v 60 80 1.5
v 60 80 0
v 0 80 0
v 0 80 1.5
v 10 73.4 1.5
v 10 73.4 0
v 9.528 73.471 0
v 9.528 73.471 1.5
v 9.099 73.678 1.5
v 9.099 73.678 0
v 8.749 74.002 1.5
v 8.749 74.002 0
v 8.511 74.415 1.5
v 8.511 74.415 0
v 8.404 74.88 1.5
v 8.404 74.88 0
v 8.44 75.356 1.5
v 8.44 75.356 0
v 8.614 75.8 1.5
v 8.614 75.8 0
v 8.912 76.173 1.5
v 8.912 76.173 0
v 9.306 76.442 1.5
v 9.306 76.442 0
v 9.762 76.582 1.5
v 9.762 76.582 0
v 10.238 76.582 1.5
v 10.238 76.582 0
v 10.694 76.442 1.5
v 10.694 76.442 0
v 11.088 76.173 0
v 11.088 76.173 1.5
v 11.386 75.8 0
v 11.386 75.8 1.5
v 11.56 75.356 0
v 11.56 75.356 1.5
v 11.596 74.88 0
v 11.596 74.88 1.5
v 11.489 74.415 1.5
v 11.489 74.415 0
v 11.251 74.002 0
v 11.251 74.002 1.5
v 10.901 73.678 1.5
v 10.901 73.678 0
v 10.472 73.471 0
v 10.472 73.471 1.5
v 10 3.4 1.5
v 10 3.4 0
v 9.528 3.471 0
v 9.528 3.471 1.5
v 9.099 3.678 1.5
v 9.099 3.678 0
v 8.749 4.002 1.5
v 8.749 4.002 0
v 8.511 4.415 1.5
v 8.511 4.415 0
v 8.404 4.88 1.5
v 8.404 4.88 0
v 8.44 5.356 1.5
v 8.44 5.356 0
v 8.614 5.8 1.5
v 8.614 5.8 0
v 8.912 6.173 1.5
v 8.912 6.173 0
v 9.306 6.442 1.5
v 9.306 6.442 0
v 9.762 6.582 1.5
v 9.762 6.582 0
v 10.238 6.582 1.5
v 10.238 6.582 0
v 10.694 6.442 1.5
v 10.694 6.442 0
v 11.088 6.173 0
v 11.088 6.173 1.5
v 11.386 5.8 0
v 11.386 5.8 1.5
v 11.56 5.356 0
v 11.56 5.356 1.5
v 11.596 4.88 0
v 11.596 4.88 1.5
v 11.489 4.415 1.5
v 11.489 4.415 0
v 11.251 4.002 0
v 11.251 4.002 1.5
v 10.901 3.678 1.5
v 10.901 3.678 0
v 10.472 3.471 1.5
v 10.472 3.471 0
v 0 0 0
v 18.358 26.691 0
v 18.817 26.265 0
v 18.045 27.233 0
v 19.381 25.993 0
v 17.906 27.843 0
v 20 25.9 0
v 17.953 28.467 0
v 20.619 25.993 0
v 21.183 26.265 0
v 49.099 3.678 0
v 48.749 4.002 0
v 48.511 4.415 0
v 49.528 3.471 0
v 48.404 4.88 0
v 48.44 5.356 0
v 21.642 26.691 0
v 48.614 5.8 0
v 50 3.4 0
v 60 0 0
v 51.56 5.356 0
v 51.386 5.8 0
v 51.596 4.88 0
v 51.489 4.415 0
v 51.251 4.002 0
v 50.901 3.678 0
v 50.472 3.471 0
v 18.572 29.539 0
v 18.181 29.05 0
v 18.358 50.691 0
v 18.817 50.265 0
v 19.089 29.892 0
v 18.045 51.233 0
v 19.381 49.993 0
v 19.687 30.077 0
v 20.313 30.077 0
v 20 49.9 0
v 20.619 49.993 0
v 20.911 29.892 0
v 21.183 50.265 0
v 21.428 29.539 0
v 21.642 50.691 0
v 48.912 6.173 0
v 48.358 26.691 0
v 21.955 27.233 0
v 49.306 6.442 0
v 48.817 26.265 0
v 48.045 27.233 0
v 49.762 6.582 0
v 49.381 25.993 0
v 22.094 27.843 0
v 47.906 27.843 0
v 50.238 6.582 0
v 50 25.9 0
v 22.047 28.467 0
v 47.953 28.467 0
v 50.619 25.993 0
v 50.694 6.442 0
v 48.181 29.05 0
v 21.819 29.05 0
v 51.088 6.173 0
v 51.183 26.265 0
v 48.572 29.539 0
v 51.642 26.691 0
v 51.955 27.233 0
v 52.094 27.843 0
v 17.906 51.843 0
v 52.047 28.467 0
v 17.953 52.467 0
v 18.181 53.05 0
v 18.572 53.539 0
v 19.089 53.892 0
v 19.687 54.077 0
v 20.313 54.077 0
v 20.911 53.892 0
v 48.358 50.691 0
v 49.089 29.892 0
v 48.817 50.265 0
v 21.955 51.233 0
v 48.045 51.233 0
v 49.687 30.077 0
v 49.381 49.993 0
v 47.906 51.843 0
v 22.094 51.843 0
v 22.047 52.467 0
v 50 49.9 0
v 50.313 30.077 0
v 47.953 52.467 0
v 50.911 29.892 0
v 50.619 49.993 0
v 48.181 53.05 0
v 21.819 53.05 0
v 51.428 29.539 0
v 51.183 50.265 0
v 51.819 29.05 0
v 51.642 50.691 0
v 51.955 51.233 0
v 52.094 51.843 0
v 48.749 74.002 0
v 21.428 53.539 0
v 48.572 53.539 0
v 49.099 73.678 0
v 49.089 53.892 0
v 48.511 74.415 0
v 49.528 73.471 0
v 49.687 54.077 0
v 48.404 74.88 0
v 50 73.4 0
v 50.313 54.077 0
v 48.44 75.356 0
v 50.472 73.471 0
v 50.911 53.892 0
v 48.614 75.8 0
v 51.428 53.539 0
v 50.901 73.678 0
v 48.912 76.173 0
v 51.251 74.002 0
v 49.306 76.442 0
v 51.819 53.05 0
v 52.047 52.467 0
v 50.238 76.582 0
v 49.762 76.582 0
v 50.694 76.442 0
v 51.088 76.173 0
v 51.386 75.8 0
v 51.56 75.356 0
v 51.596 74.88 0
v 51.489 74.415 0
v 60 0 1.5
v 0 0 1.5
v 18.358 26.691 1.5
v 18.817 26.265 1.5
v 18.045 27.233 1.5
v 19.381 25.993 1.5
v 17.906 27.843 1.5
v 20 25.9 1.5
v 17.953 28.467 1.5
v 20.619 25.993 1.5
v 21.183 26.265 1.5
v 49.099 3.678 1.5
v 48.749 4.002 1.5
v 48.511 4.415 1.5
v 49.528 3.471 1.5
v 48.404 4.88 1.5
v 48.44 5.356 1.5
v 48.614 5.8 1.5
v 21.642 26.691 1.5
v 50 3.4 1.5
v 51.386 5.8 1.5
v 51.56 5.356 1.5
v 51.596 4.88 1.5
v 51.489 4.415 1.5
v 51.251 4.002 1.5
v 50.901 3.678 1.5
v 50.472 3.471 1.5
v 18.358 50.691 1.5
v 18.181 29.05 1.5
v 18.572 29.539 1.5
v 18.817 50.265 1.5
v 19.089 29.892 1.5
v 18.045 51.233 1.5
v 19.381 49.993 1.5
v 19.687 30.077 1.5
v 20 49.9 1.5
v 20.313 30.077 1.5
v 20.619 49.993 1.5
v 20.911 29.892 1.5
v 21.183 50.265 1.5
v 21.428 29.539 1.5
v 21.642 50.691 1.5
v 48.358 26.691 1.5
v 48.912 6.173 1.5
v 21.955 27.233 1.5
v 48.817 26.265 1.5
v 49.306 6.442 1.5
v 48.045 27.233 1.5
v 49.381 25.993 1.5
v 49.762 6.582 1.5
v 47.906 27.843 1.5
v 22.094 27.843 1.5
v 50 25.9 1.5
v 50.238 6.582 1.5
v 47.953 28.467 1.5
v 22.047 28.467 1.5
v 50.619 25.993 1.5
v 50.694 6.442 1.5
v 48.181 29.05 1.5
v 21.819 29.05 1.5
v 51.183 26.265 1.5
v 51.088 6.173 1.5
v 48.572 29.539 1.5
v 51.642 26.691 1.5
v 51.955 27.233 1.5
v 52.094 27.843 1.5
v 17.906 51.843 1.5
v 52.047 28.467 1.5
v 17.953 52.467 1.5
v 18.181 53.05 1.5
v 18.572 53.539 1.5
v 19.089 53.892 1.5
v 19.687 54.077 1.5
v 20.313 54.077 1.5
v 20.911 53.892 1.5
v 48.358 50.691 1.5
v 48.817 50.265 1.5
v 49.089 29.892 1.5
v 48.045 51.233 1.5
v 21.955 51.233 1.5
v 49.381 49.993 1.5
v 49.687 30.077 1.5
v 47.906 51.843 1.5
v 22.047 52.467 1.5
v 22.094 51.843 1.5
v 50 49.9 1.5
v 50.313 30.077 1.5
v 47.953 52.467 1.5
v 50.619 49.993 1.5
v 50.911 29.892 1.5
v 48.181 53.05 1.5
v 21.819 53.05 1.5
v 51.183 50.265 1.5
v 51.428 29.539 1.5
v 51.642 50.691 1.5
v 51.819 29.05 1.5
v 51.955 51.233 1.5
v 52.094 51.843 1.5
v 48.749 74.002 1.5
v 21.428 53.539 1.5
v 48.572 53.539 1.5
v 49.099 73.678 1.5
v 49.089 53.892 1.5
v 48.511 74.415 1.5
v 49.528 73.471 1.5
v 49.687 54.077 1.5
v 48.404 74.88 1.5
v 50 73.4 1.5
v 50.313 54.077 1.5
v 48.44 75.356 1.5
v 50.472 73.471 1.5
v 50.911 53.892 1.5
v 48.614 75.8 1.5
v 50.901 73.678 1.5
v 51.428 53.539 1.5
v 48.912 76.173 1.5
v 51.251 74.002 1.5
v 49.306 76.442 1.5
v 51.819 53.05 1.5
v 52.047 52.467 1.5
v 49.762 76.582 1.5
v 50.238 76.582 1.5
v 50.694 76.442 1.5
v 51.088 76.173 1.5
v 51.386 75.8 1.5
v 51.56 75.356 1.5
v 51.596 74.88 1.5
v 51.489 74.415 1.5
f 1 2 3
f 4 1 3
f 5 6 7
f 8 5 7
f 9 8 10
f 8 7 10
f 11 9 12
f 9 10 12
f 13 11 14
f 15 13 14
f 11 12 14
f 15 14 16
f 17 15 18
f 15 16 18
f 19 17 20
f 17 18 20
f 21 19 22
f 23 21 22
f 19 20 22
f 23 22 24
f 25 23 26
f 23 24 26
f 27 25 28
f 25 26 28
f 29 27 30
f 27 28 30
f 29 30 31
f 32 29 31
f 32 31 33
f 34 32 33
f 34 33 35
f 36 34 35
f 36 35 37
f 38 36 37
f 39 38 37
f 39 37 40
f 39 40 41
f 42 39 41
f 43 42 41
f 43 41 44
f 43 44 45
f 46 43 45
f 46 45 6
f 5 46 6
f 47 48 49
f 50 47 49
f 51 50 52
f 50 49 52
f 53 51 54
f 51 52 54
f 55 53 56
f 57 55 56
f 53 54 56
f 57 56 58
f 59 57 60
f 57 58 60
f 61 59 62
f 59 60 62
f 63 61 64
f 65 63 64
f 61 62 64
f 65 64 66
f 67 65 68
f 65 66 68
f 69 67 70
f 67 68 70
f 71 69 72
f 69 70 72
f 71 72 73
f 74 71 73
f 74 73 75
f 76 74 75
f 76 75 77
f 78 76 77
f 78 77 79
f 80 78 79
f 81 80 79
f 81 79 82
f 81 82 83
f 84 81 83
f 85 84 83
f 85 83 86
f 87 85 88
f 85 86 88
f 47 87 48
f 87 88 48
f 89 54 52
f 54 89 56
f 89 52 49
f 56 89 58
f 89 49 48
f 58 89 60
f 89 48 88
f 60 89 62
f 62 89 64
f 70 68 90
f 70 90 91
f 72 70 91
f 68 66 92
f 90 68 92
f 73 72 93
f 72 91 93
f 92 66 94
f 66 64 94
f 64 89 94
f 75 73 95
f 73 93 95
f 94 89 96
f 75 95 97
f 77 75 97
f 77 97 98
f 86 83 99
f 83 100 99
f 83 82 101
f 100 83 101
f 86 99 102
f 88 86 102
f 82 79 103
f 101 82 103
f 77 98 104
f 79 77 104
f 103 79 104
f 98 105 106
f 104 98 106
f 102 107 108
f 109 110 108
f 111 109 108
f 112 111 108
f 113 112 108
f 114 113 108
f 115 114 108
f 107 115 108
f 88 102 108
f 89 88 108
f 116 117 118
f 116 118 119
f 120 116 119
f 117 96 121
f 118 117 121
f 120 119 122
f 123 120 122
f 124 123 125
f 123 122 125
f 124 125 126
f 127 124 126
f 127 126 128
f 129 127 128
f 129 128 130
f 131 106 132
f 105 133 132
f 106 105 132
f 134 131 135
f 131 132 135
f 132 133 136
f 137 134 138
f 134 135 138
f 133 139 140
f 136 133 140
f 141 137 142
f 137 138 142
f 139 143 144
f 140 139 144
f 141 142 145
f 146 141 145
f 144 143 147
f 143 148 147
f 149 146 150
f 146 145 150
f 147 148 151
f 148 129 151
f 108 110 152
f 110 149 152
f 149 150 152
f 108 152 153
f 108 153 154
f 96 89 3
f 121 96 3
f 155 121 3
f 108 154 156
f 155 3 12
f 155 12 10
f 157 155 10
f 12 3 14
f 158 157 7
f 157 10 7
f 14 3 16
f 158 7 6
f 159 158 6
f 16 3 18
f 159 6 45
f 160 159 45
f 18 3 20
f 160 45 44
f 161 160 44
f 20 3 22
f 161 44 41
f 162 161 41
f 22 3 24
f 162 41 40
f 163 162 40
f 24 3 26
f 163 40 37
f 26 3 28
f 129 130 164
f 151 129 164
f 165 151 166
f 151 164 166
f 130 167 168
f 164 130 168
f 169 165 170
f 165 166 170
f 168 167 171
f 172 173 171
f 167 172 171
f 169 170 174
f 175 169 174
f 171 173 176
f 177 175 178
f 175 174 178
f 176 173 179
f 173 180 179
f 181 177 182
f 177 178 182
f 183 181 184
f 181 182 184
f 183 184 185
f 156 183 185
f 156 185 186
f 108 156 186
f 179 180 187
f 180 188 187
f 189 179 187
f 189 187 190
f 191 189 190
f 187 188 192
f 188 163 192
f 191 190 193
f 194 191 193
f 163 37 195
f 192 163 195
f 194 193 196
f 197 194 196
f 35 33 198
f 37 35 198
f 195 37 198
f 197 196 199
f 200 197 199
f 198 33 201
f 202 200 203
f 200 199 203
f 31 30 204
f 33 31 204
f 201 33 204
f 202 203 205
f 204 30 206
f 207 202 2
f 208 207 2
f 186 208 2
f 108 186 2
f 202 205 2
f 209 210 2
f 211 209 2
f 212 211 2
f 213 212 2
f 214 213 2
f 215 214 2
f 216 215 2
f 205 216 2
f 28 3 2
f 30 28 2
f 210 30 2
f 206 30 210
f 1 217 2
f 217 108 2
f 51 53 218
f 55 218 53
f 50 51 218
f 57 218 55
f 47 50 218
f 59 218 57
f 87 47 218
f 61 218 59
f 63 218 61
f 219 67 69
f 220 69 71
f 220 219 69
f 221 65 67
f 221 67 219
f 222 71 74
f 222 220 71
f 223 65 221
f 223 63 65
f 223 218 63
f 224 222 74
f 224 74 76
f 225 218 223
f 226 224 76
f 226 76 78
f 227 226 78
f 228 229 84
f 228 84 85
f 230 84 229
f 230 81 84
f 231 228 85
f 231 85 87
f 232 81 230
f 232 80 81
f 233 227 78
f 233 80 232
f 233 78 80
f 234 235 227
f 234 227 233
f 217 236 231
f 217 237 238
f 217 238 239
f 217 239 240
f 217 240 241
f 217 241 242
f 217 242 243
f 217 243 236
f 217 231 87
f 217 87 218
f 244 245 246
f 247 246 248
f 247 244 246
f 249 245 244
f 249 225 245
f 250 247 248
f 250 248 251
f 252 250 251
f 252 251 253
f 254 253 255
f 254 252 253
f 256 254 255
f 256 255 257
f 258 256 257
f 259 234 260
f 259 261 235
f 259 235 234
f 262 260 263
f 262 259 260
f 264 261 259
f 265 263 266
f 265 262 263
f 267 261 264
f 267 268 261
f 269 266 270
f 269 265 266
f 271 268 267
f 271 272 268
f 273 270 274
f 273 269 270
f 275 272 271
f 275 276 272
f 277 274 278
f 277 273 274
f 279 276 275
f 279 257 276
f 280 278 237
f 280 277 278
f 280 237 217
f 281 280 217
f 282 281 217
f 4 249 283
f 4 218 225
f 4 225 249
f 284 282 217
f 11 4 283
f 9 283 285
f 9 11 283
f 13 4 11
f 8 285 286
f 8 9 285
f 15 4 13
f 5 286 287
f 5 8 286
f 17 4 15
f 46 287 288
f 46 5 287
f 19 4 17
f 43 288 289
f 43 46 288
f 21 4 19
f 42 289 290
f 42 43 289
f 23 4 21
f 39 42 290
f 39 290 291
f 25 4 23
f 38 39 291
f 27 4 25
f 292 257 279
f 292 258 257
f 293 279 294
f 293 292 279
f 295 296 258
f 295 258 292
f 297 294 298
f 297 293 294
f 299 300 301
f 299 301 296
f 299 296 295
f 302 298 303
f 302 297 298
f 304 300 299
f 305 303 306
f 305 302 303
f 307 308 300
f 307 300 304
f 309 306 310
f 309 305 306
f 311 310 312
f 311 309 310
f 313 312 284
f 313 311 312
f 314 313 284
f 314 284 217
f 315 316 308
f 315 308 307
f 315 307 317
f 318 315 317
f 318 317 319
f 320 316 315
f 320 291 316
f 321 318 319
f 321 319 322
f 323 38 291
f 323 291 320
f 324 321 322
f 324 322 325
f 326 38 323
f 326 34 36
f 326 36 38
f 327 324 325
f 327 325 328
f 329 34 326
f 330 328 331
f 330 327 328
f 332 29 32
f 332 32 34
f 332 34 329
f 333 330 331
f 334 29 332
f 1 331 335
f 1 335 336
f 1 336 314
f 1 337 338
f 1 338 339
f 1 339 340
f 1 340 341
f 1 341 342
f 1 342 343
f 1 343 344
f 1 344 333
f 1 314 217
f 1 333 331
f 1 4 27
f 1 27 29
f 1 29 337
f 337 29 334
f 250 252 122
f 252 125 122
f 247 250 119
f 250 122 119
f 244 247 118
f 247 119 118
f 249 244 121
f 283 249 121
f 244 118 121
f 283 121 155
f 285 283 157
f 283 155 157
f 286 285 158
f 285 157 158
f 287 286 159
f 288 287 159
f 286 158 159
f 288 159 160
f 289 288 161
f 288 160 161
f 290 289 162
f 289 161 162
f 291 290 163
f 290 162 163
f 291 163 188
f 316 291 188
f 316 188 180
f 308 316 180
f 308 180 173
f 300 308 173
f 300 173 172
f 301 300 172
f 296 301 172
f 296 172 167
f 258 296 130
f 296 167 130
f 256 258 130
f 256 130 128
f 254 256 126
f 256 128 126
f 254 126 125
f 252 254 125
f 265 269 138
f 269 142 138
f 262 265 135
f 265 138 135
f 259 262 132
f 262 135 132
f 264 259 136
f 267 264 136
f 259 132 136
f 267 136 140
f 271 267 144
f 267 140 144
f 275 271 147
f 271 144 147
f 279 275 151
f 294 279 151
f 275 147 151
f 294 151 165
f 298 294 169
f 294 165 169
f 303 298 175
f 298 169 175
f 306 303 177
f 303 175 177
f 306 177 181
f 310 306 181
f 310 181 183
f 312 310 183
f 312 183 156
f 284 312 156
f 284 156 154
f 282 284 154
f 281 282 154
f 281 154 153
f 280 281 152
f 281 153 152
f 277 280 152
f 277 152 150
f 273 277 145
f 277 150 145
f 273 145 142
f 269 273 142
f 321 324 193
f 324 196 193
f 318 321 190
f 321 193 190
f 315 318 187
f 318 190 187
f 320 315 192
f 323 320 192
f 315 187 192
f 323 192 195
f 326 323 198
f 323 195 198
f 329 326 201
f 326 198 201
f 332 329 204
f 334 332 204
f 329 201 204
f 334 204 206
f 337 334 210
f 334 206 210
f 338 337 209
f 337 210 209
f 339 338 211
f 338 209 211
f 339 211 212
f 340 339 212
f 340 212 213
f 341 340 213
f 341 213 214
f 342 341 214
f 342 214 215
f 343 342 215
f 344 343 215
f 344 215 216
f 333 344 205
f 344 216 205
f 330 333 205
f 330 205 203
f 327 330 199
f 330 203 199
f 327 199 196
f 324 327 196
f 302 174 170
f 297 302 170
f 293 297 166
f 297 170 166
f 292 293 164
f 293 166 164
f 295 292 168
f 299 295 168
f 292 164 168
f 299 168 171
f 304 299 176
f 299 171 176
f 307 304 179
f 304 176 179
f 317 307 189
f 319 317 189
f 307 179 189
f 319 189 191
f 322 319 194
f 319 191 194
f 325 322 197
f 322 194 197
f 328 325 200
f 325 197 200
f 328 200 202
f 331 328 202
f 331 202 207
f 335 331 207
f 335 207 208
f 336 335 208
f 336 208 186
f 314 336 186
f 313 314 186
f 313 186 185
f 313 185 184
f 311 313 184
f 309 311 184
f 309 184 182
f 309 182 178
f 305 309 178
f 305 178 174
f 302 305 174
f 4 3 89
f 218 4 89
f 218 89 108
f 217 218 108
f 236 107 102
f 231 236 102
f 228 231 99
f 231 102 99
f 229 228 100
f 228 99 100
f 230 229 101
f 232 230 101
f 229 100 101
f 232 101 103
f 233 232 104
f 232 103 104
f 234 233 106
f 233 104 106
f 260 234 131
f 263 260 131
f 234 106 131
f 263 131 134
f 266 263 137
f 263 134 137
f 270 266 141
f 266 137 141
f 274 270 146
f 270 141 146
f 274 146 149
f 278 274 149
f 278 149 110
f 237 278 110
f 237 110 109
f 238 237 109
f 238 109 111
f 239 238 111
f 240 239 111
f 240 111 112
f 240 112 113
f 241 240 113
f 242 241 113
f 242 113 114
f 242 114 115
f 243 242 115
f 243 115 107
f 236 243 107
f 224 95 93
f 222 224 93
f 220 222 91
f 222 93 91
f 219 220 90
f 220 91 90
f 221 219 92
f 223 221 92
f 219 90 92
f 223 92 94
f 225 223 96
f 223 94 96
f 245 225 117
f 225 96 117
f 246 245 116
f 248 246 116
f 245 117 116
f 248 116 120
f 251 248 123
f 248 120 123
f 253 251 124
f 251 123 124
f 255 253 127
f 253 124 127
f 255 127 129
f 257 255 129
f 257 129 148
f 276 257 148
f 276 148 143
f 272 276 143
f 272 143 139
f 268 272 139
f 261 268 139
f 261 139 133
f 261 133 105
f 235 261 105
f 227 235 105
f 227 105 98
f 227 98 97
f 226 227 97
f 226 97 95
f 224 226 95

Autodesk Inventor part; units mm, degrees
ref_plane "YZ Plane" through (0, 0, 0) normal (1, 0, 0) x (0, 1, 0)
ref_plane "XZ Plane" through (0, 0, 0) normal (0, 1, 0) x (-1, 0, 0)
ref_plane "XY Plane" through (0, 0, 0) normal (0, 0, 1) x (1, 0, 0)
sketch "スケッチ1" plane through (0, 0, 0) normal (0, 0, 1) x (1, 0, 0)
  line L0 (0, 0) -> (60, 0)
  line L1 (60, 0) -> (60, 80)
  line L2 (60, 80) -> (0, 80)
  line L3 (0, 80) -> (0, 0)
  dimension "d0" = 80
  dimension "d1" = 60
extrude "押し出し1" add sketch "スケッチ1" along normal blind 1.5
sketch "スケッチ2" plane through (0, 0, 1.5) normal (0, 0, 1) x (1, 0, 0)
  line L0 (60, 0) -> (60, 80) projected
  line L1 (0, 0) -> (60, 0) projected
  line L2 (60, 80) -> (0, 80) projected
  point P0 (10, 5)
  point P1 (50, 5)
  point P2 (50, 75)
  point P3 (10, 75)
  dimension "d4" = 10
  dimension "d5" = 40
  dimension "d7" = 5
  dimension "d8" = 5
hole "穴1" at (10, 5, 1.5) at (50, 5, 1.5) at (50, 75, 1.5) at (10, 75, 1.5) direction (0, 0, -1) diameter 3.2 depth 8.8 tip angle 118
sketch "スケッチ3" plane through (0, 0, 1.5) normal (0, 0, 1) x (1, 0, 0)
  line L0 (60, 80) -> (0, 80) projected
  line L1 (60, 0) -> (60, 80) projected
  point P0 (0, 0)
  point P1 (20, 52)
  point P2 (50, 52)
  point P3 (50, 28)
  point P4 (20, 28)
  dimension "d16" = 30
  dimension "d17" = 24
  dimension "d18" = 28
  dimension "d19" = 10
hole "穴2" at (20, 52, 1.5) at (50, 52, 1.5) at (50, 28, 1.5) at (20, 28, 1.5) direction (0, 0, -1) diameter 4.2 depth 8.8 tip angle 118
properties part number "キャスター土台"
